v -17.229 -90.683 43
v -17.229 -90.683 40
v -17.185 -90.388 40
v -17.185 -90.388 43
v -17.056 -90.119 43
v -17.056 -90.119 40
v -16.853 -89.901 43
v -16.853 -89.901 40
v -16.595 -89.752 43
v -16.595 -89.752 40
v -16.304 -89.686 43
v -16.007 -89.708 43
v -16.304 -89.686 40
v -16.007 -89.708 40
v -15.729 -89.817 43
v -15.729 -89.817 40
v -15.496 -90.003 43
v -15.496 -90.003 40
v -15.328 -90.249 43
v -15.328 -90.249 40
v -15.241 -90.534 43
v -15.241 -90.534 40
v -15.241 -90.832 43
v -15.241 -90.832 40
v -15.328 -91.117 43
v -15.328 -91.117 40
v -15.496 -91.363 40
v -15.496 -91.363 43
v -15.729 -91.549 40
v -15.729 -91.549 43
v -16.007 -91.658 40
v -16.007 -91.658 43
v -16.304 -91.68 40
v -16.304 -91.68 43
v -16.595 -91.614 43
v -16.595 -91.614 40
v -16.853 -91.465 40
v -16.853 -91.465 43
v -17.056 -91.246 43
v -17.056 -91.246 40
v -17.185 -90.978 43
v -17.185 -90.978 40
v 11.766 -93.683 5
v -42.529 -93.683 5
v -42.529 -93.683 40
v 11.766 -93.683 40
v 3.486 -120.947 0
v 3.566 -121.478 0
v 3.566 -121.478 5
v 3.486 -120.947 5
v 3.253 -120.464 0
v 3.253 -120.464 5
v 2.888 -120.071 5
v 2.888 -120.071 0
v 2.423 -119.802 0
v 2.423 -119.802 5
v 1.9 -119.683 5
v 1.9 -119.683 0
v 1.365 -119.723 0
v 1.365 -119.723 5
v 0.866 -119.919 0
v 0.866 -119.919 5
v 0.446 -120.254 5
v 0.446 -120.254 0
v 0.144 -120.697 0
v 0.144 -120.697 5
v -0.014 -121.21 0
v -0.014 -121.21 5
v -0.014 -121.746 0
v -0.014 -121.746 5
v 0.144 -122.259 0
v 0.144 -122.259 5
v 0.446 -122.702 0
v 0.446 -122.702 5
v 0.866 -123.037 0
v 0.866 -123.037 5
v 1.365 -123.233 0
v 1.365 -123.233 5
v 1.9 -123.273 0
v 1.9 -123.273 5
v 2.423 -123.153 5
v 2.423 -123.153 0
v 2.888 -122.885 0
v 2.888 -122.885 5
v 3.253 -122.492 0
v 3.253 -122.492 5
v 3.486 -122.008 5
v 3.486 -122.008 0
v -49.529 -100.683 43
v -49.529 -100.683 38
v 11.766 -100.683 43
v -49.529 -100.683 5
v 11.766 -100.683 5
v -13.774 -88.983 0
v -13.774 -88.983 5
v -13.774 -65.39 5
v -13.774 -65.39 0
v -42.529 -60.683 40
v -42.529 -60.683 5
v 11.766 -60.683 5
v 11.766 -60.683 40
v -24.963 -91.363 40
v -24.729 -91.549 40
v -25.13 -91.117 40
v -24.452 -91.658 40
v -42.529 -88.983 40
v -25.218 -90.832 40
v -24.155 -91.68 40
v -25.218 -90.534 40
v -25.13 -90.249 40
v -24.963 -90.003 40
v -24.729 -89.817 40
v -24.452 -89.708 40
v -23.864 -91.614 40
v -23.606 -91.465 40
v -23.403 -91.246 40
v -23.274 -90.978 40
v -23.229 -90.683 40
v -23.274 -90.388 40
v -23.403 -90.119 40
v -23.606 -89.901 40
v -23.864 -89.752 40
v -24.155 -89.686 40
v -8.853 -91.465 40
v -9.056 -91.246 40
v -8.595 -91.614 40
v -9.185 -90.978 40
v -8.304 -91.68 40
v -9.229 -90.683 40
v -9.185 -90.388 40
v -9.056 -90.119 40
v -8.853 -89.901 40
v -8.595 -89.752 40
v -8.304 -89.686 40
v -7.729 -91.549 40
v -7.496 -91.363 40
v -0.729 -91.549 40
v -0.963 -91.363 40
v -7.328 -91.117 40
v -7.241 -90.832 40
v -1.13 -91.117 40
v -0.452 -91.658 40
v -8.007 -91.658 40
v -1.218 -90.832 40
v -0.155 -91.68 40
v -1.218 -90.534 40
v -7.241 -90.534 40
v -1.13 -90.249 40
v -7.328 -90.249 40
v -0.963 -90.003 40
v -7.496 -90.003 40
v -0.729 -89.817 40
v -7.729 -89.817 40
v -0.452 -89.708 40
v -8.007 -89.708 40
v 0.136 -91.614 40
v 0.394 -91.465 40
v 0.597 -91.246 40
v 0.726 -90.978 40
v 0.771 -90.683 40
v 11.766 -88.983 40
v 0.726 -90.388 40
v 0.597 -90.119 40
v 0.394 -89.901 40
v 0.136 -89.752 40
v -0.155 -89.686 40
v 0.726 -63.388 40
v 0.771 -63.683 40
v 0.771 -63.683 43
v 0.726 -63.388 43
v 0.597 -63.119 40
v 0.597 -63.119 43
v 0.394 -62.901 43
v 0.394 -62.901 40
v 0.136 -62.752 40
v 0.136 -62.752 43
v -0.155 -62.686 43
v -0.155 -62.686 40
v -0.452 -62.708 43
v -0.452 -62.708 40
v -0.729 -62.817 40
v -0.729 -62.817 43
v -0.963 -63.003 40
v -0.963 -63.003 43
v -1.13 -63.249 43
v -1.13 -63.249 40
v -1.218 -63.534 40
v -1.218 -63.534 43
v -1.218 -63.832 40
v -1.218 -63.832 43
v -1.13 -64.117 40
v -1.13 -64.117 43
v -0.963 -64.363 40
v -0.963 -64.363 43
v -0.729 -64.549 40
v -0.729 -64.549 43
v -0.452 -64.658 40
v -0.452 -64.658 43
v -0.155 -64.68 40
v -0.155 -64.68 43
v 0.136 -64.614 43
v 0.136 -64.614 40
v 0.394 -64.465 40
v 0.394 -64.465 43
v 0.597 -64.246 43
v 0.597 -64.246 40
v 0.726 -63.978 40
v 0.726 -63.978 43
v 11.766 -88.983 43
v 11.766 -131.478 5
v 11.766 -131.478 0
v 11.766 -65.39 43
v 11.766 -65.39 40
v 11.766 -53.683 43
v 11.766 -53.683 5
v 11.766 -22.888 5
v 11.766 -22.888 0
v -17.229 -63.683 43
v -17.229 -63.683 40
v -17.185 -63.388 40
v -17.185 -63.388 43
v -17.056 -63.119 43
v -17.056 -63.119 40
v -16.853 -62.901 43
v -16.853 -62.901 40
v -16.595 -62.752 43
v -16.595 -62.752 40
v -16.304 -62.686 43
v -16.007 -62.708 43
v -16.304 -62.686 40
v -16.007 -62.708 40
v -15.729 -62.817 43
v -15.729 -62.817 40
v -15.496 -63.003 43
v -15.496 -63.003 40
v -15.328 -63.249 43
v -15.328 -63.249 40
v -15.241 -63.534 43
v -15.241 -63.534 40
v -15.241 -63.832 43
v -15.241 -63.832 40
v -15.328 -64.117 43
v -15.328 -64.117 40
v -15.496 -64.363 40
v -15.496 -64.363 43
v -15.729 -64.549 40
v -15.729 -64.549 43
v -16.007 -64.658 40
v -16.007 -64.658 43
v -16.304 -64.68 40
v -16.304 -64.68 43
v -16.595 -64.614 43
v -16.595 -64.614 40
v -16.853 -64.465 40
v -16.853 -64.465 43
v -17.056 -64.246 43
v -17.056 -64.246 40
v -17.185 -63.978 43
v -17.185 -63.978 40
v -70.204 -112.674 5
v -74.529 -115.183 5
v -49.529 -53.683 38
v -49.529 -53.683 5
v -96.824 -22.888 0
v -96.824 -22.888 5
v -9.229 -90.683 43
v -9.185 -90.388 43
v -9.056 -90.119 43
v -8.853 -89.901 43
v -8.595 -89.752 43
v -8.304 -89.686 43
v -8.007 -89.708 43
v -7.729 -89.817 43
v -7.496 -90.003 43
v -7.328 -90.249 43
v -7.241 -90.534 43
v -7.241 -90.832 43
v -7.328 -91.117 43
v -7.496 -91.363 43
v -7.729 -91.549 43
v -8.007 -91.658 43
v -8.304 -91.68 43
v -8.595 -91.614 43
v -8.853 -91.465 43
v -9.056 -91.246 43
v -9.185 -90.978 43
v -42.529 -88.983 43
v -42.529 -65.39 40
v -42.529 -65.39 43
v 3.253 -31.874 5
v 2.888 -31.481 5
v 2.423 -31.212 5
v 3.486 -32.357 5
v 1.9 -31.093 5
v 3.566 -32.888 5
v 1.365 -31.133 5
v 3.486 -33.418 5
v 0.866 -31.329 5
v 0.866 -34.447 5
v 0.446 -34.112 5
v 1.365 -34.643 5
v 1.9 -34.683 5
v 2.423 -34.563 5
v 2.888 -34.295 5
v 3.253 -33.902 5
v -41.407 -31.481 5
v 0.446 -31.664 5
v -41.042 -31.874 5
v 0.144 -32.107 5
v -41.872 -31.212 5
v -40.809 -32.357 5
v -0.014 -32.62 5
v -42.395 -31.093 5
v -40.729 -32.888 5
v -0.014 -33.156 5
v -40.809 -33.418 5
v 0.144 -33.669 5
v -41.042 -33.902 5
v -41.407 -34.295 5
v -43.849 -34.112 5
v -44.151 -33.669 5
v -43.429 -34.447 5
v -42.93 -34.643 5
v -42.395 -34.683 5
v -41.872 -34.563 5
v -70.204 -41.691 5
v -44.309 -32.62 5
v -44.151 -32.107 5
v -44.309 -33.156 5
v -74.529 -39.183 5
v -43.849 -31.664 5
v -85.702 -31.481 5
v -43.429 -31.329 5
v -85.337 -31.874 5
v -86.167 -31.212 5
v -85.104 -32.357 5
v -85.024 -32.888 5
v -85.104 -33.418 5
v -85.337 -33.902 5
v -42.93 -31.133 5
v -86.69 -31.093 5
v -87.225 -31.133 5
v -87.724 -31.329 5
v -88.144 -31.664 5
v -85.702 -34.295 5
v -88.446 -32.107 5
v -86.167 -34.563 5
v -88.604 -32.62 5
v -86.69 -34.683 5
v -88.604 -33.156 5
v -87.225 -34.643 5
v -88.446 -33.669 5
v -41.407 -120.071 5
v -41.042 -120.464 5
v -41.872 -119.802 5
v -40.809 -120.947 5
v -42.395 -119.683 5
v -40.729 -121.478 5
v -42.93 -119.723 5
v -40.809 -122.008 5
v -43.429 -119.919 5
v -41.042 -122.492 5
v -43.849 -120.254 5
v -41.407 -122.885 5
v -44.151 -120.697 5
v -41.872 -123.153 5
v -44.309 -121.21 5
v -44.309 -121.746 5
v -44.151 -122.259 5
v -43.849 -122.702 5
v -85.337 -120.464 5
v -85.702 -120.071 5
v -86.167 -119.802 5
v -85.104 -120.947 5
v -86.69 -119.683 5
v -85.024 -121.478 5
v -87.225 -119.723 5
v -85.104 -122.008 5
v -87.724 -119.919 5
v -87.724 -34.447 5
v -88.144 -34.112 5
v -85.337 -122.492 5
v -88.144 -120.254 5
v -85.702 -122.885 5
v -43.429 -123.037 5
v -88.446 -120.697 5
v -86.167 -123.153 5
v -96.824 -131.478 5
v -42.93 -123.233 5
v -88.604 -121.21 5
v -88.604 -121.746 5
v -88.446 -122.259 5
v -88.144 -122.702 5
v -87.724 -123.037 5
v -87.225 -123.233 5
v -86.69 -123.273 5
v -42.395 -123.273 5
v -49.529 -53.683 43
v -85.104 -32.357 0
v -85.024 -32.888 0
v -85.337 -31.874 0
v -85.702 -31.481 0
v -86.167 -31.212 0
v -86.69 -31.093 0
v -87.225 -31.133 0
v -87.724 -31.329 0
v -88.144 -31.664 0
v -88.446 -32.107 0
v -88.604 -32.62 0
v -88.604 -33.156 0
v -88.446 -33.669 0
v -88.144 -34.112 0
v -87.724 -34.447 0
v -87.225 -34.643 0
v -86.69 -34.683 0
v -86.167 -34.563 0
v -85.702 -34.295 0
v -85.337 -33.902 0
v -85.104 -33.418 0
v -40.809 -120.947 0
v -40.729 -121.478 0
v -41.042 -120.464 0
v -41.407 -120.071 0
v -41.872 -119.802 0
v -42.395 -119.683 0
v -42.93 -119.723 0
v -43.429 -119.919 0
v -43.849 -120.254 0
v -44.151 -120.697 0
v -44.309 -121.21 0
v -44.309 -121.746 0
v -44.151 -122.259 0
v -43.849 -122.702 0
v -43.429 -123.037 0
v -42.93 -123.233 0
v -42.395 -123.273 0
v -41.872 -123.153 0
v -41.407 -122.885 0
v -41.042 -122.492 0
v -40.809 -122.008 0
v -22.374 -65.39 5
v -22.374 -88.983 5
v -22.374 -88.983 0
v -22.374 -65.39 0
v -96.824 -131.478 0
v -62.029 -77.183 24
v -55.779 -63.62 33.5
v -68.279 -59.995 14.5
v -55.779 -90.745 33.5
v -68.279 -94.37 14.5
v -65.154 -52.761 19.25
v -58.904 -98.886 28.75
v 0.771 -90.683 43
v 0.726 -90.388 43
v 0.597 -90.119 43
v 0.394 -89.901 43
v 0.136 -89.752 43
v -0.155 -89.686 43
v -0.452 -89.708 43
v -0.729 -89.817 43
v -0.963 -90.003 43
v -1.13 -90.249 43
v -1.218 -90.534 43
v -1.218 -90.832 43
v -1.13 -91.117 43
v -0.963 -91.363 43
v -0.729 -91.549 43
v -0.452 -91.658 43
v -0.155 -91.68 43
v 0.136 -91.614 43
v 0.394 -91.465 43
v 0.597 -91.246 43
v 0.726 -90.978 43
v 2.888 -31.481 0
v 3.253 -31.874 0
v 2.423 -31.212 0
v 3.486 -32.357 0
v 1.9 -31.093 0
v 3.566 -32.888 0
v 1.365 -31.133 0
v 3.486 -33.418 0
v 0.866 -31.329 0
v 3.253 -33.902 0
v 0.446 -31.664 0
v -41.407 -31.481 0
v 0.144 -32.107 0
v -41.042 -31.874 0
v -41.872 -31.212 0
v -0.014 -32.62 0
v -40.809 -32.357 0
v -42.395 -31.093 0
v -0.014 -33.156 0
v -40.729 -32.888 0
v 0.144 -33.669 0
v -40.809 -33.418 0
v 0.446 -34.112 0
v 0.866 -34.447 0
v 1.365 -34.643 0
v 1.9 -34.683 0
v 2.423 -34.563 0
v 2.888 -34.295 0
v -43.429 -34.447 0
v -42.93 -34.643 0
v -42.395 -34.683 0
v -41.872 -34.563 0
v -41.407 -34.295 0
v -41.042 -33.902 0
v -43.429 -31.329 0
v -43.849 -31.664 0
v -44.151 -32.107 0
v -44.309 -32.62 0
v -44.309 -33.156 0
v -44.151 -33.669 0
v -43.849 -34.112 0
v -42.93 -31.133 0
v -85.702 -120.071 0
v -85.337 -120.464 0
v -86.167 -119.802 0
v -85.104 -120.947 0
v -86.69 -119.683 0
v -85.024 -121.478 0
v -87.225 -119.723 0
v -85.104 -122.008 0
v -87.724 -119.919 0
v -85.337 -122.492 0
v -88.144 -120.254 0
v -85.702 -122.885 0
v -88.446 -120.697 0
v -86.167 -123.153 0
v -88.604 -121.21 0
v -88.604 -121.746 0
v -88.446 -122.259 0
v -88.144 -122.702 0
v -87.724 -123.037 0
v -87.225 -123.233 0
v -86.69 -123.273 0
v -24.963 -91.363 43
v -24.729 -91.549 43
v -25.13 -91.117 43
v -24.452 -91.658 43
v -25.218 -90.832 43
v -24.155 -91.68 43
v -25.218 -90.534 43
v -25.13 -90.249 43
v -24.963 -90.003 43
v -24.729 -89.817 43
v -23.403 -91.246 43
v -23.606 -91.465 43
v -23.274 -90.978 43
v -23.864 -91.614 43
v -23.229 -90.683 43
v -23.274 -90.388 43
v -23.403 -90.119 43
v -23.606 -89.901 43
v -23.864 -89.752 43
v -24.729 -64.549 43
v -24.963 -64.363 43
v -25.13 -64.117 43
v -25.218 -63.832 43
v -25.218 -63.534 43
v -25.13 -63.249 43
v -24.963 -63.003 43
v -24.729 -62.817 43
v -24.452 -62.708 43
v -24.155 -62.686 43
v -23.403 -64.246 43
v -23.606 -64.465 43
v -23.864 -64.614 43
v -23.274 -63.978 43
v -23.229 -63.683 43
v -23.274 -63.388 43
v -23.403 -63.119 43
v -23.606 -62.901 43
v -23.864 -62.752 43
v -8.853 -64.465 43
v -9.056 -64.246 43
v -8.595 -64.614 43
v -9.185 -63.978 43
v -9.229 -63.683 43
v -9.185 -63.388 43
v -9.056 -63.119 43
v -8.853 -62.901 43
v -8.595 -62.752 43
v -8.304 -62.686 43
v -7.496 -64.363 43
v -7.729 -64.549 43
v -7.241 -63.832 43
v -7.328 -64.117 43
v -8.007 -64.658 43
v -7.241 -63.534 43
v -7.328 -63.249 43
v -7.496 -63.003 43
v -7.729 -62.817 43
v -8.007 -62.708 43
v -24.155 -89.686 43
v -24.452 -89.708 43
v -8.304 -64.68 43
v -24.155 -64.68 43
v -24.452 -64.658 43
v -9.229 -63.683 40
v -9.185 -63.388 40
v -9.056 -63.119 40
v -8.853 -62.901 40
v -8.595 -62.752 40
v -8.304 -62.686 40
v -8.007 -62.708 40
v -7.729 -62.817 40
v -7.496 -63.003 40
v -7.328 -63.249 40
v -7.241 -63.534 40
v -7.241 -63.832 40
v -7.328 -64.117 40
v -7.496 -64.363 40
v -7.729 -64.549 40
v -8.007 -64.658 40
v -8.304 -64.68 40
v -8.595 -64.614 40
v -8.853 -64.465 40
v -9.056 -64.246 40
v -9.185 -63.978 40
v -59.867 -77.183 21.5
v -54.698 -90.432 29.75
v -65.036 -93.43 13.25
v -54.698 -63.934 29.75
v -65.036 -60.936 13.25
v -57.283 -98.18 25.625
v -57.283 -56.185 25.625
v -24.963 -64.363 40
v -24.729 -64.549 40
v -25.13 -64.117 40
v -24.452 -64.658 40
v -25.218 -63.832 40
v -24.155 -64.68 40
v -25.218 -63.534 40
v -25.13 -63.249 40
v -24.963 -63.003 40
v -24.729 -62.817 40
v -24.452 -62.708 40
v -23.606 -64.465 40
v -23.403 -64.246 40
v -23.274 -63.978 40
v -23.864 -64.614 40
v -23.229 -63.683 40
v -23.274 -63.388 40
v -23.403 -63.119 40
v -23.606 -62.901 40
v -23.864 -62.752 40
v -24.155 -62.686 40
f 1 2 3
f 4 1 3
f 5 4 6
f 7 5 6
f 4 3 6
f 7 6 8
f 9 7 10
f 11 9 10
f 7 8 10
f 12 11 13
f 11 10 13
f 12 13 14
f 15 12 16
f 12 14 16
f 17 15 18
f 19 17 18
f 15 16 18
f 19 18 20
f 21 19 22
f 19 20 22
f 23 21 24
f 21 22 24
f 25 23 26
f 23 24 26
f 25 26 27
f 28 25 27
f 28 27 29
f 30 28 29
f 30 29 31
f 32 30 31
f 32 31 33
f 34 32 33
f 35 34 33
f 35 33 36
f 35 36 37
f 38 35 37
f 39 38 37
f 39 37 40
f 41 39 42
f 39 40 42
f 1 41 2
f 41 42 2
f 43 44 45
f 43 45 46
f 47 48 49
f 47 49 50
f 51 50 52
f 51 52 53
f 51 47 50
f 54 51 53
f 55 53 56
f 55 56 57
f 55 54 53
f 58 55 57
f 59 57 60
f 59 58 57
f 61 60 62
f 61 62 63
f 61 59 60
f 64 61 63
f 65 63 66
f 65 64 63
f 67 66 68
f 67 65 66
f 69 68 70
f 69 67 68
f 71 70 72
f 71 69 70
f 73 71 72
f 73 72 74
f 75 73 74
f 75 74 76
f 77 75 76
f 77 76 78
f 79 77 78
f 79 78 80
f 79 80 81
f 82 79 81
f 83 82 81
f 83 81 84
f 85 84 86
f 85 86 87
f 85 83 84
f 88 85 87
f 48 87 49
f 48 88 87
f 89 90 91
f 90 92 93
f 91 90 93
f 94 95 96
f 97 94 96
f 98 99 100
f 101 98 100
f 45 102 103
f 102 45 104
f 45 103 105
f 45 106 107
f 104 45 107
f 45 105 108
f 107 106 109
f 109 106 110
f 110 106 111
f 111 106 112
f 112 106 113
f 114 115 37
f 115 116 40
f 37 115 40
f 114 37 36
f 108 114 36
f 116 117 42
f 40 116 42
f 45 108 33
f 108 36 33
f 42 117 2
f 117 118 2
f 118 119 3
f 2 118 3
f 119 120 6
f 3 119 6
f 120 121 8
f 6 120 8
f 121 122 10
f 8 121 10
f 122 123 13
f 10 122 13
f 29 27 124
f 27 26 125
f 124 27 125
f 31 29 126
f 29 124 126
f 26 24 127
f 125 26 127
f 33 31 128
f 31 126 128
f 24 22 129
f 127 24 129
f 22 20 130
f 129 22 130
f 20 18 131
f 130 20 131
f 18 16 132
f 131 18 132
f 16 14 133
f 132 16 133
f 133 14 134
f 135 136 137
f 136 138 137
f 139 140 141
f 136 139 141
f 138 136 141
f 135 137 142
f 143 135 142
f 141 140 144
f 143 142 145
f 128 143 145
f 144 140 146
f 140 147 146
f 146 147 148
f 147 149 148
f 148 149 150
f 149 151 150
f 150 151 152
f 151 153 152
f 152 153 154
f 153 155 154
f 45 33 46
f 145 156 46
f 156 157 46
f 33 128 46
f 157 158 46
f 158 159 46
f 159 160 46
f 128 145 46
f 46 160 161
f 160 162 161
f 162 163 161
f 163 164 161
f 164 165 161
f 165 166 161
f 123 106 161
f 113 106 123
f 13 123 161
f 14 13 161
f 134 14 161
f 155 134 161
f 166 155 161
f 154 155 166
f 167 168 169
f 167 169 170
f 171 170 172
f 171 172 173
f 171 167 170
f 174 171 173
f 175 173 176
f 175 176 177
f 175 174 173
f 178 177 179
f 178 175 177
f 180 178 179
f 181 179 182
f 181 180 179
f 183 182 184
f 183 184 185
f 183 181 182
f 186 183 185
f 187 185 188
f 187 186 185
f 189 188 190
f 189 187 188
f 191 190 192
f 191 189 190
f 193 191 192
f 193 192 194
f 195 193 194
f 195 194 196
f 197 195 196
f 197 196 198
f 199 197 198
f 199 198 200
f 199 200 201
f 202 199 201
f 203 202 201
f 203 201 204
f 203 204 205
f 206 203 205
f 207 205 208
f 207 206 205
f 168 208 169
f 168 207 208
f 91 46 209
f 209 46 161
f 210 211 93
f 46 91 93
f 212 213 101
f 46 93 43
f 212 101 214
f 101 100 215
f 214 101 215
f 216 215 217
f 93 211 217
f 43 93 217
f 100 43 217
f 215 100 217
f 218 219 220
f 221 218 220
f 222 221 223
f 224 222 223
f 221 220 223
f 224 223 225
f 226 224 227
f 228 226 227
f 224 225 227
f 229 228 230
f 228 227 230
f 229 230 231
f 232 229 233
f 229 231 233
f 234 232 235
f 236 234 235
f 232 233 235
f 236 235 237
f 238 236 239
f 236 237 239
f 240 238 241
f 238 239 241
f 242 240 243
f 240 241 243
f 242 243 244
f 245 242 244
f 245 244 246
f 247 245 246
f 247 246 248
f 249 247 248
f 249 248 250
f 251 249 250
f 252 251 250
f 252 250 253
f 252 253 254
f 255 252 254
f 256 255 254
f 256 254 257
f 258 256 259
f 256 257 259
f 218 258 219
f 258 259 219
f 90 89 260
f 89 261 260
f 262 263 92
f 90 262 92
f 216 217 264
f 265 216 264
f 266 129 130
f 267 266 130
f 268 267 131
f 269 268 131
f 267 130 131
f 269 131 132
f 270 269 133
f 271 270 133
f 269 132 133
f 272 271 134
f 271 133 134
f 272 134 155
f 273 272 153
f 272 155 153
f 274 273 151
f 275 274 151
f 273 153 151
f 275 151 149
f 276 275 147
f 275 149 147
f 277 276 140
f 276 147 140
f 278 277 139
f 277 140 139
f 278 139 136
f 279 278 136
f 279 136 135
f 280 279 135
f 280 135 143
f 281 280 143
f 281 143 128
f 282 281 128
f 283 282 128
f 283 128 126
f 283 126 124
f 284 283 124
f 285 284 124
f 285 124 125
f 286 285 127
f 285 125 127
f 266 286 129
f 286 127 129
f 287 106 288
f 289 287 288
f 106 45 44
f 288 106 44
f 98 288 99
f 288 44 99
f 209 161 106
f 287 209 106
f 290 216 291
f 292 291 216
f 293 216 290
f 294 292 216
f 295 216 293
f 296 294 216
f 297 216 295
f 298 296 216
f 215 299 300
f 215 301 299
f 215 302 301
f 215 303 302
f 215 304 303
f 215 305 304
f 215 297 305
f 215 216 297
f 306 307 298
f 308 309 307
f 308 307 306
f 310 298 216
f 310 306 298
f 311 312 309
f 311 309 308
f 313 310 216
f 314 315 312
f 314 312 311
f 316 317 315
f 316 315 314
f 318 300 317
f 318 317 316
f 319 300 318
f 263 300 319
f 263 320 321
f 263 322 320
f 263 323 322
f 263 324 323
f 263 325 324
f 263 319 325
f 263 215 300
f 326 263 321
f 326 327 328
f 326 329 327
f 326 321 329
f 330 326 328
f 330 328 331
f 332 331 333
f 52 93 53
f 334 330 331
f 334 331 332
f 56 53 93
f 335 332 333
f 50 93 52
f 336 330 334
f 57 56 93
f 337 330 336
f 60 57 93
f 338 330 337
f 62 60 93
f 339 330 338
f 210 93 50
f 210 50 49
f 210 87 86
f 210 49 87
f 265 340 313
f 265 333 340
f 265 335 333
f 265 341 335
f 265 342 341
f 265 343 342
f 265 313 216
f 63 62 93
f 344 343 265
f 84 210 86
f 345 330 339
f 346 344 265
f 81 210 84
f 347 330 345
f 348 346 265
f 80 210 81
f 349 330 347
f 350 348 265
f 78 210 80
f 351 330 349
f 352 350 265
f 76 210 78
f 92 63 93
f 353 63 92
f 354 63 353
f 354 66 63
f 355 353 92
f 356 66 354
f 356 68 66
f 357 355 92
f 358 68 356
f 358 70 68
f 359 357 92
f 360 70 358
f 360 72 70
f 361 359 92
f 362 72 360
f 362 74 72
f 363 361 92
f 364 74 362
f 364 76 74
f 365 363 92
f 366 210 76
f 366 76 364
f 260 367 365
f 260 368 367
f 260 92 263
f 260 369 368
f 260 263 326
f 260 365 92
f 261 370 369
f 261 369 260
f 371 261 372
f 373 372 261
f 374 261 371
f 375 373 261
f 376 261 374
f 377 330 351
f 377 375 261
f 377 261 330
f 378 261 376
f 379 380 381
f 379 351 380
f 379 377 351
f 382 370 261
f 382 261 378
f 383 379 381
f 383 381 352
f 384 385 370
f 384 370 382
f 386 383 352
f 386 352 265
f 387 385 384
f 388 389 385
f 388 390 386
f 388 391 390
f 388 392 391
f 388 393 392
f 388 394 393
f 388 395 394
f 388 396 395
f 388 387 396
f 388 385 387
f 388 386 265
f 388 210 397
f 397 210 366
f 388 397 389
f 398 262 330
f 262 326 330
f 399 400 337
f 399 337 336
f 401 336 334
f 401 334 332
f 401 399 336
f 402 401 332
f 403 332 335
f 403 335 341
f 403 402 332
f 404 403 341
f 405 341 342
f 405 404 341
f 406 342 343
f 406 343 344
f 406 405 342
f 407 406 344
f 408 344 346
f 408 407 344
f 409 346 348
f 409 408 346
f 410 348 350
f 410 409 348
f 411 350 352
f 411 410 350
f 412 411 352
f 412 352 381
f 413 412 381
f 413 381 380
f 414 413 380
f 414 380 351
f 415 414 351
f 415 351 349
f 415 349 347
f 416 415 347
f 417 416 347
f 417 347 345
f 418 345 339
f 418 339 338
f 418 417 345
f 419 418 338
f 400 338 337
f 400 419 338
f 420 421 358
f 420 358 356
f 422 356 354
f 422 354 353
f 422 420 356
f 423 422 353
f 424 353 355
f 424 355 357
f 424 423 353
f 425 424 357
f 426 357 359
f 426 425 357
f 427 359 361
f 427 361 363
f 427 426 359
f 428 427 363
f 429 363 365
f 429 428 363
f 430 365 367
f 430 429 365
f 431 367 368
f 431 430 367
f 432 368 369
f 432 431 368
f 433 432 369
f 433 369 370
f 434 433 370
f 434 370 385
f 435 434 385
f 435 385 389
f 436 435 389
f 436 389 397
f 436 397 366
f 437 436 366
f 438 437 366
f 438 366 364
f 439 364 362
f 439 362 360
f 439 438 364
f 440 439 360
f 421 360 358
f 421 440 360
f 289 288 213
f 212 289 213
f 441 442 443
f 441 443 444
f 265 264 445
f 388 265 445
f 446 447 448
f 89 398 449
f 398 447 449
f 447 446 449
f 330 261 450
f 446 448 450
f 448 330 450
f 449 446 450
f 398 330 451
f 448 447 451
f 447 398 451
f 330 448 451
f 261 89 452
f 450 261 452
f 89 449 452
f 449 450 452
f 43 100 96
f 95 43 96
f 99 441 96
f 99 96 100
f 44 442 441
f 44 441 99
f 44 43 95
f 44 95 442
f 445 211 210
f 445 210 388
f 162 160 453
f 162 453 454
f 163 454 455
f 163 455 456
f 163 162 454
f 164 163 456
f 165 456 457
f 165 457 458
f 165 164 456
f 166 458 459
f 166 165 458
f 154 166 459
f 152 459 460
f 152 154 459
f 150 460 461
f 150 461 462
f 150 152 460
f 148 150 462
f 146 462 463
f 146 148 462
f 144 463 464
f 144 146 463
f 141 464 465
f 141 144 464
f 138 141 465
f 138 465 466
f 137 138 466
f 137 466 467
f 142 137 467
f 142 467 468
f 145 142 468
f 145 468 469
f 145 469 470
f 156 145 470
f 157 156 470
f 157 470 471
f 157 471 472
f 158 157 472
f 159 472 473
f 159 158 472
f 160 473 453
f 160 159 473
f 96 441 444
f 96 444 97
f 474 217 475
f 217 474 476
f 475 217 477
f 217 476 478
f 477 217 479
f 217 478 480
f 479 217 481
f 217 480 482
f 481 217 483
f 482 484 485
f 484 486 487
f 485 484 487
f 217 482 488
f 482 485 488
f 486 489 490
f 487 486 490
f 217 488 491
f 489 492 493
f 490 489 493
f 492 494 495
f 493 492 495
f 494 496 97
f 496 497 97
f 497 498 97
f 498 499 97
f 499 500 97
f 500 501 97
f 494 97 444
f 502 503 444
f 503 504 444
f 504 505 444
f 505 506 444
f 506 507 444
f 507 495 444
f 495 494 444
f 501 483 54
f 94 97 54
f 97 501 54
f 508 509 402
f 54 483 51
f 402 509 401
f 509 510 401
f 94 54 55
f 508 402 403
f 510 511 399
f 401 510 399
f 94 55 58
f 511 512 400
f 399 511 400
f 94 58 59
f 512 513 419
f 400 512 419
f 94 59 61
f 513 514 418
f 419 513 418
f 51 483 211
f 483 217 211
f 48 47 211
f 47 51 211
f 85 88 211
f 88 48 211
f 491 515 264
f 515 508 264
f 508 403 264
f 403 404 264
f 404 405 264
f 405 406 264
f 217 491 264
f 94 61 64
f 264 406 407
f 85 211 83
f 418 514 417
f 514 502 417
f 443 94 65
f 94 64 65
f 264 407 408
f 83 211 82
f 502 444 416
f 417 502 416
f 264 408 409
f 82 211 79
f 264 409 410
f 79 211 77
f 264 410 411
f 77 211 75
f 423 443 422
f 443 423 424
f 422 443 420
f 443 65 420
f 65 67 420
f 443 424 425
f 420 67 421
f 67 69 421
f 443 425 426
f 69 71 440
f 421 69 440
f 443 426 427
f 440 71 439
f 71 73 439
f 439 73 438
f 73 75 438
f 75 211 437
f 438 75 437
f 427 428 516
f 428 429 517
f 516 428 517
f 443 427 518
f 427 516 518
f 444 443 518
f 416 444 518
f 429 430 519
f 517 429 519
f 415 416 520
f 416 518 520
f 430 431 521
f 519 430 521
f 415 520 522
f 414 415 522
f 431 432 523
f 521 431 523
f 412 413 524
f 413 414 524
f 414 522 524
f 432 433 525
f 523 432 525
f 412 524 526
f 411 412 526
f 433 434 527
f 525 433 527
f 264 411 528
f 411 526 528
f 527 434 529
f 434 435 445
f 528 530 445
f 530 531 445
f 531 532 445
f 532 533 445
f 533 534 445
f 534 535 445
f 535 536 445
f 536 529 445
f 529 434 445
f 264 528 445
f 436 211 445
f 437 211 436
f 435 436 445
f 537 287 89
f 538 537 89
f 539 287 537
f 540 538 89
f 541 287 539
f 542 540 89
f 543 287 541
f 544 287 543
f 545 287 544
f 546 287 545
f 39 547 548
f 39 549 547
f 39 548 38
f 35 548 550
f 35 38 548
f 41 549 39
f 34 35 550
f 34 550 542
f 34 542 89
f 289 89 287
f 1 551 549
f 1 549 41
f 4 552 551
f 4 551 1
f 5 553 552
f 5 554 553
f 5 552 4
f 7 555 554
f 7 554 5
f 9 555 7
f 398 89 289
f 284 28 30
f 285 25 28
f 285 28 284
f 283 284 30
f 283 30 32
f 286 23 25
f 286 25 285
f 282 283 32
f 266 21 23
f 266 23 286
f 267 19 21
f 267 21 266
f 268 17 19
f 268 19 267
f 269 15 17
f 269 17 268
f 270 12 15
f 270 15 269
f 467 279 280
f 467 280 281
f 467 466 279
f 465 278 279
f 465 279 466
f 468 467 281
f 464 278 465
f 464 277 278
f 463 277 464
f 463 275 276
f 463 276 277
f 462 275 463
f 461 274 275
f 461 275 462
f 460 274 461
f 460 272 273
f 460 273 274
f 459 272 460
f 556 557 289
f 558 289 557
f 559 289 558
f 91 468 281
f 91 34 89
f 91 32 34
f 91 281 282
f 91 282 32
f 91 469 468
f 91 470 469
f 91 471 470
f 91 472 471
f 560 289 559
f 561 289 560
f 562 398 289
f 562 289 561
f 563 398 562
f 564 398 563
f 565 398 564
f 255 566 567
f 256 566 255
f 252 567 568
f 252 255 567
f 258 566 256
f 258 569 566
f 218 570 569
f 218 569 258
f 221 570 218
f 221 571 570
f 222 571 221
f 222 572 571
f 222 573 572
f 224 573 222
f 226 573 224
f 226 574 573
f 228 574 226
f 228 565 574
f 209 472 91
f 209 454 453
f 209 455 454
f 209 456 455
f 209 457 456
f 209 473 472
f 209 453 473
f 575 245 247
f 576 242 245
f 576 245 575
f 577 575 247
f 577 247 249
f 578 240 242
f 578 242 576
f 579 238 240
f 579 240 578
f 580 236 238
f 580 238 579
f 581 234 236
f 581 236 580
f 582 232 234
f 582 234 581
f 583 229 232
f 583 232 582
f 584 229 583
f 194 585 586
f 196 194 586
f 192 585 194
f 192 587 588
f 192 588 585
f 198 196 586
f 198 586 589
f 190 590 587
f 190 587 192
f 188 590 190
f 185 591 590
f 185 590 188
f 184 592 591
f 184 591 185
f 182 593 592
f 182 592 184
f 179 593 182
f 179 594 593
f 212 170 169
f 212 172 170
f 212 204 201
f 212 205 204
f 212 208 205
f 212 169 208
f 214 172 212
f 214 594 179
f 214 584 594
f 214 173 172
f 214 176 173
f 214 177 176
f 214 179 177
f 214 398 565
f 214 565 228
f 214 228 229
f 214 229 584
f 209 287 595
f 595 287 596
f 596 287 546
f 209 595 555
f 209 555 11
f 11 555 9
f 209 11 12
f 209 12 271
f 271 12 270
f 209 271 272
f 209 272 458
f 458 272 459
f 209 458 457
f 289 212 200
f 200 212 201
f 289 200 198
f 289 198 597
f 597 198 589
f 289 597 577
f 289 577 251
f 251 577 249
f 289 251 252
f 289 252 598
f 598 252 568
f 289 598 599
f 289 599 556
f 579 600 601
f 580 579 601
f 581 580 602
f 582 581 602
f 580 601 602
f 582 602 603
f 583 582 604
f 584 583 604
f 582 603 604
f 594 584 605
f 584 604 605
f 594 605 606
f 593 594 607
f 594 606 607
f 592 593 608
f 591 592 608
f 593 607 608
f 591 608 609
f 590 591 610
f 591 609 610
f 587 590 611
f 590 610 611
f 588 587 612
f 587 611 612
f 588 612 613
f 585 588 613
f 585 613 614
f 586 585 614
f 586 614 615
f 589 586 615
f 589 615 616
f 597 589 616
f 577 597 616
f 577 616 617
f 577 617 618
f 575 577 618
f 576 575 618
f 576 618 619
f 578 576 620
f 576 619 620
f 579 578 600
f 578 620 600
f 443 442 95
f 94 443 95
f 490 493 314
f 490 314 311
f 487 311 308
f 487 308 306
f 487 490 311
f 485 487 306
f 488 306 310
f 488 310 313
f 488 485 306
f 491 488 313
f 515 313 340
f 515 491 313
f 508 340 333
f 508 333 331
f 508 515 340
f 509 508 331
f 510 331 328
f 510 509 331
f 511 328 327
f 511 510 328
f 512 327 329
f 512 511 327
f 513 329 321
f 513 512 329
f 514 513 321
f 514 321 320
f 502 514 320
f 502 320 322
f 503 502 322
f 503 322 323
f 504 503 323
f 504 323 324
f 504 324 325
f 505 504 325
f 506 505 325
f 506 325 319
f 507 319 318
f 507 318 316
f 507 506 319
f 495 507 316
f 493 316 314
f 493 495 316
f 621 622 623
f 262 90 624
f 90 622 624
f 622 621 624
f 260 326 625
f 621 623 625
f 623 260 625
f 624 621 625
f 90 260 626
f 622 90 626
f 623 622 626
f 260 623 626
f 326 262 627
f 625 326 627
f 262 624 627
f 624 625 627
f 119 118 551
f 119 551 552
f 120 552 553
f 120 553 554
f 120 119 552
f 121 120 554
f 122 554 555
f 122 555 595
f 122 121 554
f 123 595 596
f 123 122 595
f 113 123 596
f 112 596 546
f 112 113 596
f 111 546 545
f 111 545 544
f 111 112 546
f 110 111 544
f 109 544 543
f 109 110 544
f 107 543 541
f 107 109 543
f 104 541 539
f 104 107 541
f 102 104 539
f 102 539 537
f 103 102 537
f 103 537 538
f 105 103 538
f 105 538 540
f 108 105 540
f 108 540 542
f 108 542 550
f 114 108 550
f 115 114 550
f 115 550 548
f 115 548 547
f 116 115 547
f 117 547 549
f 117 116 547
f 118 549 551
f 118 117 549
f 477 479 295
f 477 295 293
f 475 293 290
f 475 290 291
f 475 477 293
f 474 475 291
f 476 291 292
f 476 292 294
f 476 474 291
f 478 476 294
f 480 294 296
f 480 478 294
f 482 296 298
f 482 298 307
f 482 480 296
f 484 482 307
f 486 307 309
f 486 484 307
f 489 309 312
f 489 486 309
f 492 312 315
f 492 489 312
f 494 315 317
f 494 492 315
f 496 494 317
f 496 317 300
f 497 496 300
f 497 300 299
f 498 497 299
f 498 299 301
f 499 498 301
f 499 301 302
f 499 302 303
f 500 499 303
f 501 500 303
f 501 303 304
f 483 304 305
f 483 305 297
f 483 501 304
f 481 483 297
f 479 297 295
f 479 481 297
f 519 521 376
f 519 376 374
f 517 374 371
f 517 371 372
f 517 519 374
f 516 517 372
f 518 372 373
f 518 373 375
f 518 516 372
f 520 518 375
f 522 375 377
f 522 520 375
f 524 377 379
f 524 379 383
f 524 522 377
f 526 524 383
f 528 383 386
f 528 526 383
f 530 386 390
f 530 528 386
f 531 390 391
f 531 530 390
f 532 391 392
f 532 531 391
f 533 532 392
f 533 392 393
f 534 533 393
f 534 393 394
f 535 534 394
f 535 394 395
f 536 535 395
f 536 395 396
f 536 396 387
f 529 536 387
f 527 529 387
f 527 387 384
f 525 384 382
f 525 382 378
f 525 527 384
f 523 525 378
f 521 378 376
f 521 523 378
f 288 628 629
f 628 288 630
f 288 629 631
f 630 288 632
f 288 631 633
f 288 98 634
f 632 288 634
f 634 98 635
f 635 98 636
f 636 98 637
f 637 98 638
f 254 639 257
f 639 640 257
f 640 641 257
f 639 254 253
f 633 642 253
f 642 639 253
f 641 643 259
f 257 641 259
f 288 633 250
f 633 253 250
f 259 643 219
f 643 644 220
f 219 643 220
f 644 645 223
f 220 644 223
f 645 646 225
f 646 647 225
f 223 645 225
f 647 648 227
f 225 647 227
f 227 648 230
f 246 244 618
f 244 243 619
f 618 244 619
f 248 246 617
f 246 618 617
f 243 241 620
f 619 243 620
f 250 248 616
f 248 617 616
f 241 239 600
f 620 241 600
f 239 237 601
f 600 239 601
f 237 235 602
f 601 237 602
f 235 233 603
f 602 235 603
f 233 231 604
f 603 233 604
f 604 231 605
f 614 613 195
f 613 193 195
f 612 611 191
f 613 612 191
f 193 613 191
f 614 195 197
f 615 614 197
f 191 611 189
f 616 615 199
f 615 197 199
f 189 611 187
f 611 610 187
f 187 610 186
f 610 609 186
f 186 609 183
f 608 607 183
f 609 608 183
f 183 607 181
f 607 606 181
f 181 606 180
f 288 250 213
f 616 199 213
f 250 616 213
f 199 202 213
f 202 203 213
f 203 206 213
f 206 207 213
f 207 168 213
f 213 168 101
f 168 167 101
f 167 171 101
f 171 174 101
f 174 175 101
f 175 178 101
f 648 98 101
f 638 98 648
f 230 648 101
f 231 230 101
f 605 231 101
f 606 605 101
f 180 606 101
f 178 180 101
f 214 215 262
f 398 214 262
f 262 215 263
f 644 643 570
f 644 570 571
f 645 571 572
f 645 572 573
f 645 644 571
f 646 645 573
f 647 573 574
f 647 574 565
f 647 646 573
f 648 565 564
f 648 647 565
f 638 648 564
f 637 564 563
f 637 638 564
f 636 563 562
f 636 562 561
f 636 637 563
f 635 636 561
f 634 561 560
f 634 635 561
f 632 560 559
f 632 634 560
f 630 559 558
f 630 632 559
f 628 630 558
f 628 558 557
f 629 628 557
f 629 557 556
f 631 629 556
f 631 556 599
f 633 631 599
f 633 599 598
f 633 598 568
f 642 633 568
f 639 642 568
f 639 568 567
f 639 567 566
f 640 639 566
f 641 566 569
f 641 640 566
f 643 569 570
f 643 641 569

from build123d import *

# Parameters (mm, degrees)
ESQUISSE1_R             = 1.8
BOSS_EXTRU_1_DEPTH      = 5
BOSS_EXTRU_2_DEPTH      = 35
ESQUISSE3_R             = 1
BOSS_EXTRU_3_DEPTH      = 3
ESQUISSE4_W             = 8.59995714
ESQUISSE4_H             = 23.592650329
ENL_V_MAT_EXTRU_1_DEPTH = 5


with BuildPart() as part:
    # Esquisse1 → Boss.-Extru.1 (new body)
    with BuildSketch(Plane(origin=(0, 0, 0), x_dir=(-1, 0, 0), z_dir=(0, 0, 1))):
        Polygon((96.824454852, 121.477817805), (96.824454852, 131.477817805), (-1.765545148, 131.477817805), (-11.765545148, 131.477817805), (-11.765545148, 22.887817805), (-1.765545148, 22.887817805), (42.529454852, 22.887817805), (86.824454852, 22.887817805), (96.824454852, 22.887817805), align=None)
        with BuildLine():
            ThreePointArc((0.034454852, 32.887817805), (-0.492752942, 31.615025599), (-1.765545148, 31.087817805))
            ThreePointArc((-1.765545148, 31.087817805), (-3.038337355, 34.160610011), (0.034454852, 32.887817805))
        make_face(mode=Mode.SUBTRACT)
        with BuildLine():
            ThreePointArc((44.329454852, 32.887817805), (43.802247058, 31.615025599), (42.529454852, 31.087817805))
            ThreePointArc((42.529454852, 31.087817805), (40.729454852, 32.887817805), (42.529454852, 34.687817805))
            ThreePointArc((42.529454852, 34.687817805), (43.802247058, 34.160610011), (44.329454852, 32.887817805))
        make_face(mode=Mode.SUBTRACT)
        with BuildLine():
            ThreePointArc((88.624454852, 32.887817805), (88.097247058, 31.615025599), (86.824454852, 31.087817805))
            ThreePointArc((86.824454852, 31.087817805), (85.551662645, 34.160610011), (88.624454852, 32.887817805))
        make_face(mode=Mode.SUBTRACT)
        with BuildLine():
            ThreePointArc((0.034454852, 121.477817805), (-3.038337355, 120.205025599), (-1.765545148, 123.277817805))
            ThreePointArc((-1.765545148, 123.277817805), (-0.492752942, 122.750610011), (0.034454852, 121.477817805))
        make_face(mode=Mode.SUBTRACT)
        with BuildLine():
            ThreePointArc((44.329454852, 121.477817805), (43.802247058, 120.205025599), (42.529454852, 119.677817805))
            ThreePointArc((42.529454852, 119.677817805), (41.256662645, 122.750610011), (44.329454852, 121.477817805))
        make_face(mode=Mode.SUBTRACT)
        with Locations((86.824454852, 121.477817805)):
            Circle(ESQUISSE1_R, mode=Mode.SUBTRACT)
    extrude(amount=BOSS_EXTRU_1_DEPTH)

    # Esquisse2 → Boss.-Extru.2 (add)
    with BuildSketch(Plane.XY.offset(5)):
        Polygon((11.765545148, -53.682817805), (-49.529454852, -53.682817805), (-49.529454852, -100.682817805), (11.765545148, -100.682817805), (11.765545148, -93.682817805), (-42.529454852, -93.682817805), (-42.529454852, -60.682817805), (11.765545148, -60.682817805), align=None)
    extrude(amount=BOSS_EXTRU_2_DEPTH)

    # Esquisse3 → Boss.-Extru.3 (add)
    with BuildSketch(Plane.XY.offset(40)):
        Polygon((-42.529454852, -65.390167476), (11.765545148, -65.390167476), (11.765545148, -53.682817805), (-49.529454852, -53.682817805), (-49.529454852, -100.682817805), (11.765545148, -100.682817805), (11.765545148, -88.982817805), (-42.529454852, -88.982817805), align=None)
        with Locations((-24.229454852, -63.682817805)):
            Circle(ESQUISSE3_R, mode=Mode.SUBTRACT)
        with BuildLine():
            ThreePointArc((-15.229454852, -63.682817805), (-16.229454852, -64.682817805), (-17.229454852, -63.682817805))
            ThreePointArc((-17.229454852, -63.682817805), (-16.229454852, -62.682817805), (-15.229454852, -63.682817805))
        make_face(mode=Mode.SUBTRACT)
        with BuildLine():
            ThreePointArc((-7.229454852, -63.682817805), (-8.229454852, -64.682817805), (-9.229454852, -63.682817805))
            ThreePointArc((-9.229454852, -63.682817805), (-8.229454852, -62.682817805), (-7.229454852, -63.682817805))
        make_face(mode=Mode.SUBTRACT)
        with Locations((-0.229454852, -63.682817805)):
            Circle(ESQUISSE3_R, mode=Mode.SUBTRACT)
        with Locations((-24.229454852, -90.682817805)):
            Circle(ESQUISSE3_R, mode=Mode.SUBTRACT)
        with BuildLine():
            ThreePointArc((-15.229454852, -90.682817805), (-16.229454852, -91.682817805), (-17.229454852, -90.682817805))
            ThreePointArc((-17.229454852, -90.682817805), (-16.229454852, -89.682817805), (-15.229454852, -90.682817805))
        make_face(mode=Mode.SUBTRACT)
        with BuildLine():
            ThreePointArc((-7.229454852, -90.682817805), (-8.229454852, -91.682817805), (-9.229454852, -90.682817805))
            ThreePointArc((-9.229454852, -90.682817805), (-8.229454852, -89.682817805), (-7.229454852, -90.682817805))
        make_face(mode=Mode.SUBTRACT)
        with Locations((-0.229454852, -90.682817805)):
            Circle(ESQUISSE3_R, mode=Mode.SUBTRACT)
    extrude(amount=BOSS_EXTRU_3_DEPTH)

    # Esquisse4 → Enlèv. mat.-Extru.1 (cut)
    with BuildSketch(Plane.XY.offset(5)):
        with Locations((-18.074099951, -77.186492641)):
            Rectangle(ESQUISSE4_W, ESQUISSE4_H)
    extrude(amount=-ENL_V_MAT_EXTRU_1_DEPTH, mode=Mode.SUBTRACT)

    # Esquisse5 → Lissage3 section 0
    with BuildSketch(Plane.ZY.offset(49.529454852)):
        with BuildLine():
            Line((43, -100.682817805), (38, -100.682817805))
            Line((38, -100.682817805), (38, -53.682817805))
            Line((38, -53.682817805), (43, -53.682817805))
            Line((43, -53.682817805), (43, -100.682817805))
        make_face()
    # Esquisse6 → Lissage3 section 1
    with BuildSketch(Plane.XY.offset(5)):
        with BuildLine():
            Line((-74.529454852, -115.182817805), (-74.529454852, -39.182817805))
            Line((-74.529454852, -39.182817805), (-70.204298905, -41.691408254))
            Line((-70.204298905, -41.691408254), (-70.204298905, -112.674227356))
            Line((-70.204298905, -112.674227356), (-74.529454852, -115.182817805))
        make_face()
    loft()


solid = part.part
